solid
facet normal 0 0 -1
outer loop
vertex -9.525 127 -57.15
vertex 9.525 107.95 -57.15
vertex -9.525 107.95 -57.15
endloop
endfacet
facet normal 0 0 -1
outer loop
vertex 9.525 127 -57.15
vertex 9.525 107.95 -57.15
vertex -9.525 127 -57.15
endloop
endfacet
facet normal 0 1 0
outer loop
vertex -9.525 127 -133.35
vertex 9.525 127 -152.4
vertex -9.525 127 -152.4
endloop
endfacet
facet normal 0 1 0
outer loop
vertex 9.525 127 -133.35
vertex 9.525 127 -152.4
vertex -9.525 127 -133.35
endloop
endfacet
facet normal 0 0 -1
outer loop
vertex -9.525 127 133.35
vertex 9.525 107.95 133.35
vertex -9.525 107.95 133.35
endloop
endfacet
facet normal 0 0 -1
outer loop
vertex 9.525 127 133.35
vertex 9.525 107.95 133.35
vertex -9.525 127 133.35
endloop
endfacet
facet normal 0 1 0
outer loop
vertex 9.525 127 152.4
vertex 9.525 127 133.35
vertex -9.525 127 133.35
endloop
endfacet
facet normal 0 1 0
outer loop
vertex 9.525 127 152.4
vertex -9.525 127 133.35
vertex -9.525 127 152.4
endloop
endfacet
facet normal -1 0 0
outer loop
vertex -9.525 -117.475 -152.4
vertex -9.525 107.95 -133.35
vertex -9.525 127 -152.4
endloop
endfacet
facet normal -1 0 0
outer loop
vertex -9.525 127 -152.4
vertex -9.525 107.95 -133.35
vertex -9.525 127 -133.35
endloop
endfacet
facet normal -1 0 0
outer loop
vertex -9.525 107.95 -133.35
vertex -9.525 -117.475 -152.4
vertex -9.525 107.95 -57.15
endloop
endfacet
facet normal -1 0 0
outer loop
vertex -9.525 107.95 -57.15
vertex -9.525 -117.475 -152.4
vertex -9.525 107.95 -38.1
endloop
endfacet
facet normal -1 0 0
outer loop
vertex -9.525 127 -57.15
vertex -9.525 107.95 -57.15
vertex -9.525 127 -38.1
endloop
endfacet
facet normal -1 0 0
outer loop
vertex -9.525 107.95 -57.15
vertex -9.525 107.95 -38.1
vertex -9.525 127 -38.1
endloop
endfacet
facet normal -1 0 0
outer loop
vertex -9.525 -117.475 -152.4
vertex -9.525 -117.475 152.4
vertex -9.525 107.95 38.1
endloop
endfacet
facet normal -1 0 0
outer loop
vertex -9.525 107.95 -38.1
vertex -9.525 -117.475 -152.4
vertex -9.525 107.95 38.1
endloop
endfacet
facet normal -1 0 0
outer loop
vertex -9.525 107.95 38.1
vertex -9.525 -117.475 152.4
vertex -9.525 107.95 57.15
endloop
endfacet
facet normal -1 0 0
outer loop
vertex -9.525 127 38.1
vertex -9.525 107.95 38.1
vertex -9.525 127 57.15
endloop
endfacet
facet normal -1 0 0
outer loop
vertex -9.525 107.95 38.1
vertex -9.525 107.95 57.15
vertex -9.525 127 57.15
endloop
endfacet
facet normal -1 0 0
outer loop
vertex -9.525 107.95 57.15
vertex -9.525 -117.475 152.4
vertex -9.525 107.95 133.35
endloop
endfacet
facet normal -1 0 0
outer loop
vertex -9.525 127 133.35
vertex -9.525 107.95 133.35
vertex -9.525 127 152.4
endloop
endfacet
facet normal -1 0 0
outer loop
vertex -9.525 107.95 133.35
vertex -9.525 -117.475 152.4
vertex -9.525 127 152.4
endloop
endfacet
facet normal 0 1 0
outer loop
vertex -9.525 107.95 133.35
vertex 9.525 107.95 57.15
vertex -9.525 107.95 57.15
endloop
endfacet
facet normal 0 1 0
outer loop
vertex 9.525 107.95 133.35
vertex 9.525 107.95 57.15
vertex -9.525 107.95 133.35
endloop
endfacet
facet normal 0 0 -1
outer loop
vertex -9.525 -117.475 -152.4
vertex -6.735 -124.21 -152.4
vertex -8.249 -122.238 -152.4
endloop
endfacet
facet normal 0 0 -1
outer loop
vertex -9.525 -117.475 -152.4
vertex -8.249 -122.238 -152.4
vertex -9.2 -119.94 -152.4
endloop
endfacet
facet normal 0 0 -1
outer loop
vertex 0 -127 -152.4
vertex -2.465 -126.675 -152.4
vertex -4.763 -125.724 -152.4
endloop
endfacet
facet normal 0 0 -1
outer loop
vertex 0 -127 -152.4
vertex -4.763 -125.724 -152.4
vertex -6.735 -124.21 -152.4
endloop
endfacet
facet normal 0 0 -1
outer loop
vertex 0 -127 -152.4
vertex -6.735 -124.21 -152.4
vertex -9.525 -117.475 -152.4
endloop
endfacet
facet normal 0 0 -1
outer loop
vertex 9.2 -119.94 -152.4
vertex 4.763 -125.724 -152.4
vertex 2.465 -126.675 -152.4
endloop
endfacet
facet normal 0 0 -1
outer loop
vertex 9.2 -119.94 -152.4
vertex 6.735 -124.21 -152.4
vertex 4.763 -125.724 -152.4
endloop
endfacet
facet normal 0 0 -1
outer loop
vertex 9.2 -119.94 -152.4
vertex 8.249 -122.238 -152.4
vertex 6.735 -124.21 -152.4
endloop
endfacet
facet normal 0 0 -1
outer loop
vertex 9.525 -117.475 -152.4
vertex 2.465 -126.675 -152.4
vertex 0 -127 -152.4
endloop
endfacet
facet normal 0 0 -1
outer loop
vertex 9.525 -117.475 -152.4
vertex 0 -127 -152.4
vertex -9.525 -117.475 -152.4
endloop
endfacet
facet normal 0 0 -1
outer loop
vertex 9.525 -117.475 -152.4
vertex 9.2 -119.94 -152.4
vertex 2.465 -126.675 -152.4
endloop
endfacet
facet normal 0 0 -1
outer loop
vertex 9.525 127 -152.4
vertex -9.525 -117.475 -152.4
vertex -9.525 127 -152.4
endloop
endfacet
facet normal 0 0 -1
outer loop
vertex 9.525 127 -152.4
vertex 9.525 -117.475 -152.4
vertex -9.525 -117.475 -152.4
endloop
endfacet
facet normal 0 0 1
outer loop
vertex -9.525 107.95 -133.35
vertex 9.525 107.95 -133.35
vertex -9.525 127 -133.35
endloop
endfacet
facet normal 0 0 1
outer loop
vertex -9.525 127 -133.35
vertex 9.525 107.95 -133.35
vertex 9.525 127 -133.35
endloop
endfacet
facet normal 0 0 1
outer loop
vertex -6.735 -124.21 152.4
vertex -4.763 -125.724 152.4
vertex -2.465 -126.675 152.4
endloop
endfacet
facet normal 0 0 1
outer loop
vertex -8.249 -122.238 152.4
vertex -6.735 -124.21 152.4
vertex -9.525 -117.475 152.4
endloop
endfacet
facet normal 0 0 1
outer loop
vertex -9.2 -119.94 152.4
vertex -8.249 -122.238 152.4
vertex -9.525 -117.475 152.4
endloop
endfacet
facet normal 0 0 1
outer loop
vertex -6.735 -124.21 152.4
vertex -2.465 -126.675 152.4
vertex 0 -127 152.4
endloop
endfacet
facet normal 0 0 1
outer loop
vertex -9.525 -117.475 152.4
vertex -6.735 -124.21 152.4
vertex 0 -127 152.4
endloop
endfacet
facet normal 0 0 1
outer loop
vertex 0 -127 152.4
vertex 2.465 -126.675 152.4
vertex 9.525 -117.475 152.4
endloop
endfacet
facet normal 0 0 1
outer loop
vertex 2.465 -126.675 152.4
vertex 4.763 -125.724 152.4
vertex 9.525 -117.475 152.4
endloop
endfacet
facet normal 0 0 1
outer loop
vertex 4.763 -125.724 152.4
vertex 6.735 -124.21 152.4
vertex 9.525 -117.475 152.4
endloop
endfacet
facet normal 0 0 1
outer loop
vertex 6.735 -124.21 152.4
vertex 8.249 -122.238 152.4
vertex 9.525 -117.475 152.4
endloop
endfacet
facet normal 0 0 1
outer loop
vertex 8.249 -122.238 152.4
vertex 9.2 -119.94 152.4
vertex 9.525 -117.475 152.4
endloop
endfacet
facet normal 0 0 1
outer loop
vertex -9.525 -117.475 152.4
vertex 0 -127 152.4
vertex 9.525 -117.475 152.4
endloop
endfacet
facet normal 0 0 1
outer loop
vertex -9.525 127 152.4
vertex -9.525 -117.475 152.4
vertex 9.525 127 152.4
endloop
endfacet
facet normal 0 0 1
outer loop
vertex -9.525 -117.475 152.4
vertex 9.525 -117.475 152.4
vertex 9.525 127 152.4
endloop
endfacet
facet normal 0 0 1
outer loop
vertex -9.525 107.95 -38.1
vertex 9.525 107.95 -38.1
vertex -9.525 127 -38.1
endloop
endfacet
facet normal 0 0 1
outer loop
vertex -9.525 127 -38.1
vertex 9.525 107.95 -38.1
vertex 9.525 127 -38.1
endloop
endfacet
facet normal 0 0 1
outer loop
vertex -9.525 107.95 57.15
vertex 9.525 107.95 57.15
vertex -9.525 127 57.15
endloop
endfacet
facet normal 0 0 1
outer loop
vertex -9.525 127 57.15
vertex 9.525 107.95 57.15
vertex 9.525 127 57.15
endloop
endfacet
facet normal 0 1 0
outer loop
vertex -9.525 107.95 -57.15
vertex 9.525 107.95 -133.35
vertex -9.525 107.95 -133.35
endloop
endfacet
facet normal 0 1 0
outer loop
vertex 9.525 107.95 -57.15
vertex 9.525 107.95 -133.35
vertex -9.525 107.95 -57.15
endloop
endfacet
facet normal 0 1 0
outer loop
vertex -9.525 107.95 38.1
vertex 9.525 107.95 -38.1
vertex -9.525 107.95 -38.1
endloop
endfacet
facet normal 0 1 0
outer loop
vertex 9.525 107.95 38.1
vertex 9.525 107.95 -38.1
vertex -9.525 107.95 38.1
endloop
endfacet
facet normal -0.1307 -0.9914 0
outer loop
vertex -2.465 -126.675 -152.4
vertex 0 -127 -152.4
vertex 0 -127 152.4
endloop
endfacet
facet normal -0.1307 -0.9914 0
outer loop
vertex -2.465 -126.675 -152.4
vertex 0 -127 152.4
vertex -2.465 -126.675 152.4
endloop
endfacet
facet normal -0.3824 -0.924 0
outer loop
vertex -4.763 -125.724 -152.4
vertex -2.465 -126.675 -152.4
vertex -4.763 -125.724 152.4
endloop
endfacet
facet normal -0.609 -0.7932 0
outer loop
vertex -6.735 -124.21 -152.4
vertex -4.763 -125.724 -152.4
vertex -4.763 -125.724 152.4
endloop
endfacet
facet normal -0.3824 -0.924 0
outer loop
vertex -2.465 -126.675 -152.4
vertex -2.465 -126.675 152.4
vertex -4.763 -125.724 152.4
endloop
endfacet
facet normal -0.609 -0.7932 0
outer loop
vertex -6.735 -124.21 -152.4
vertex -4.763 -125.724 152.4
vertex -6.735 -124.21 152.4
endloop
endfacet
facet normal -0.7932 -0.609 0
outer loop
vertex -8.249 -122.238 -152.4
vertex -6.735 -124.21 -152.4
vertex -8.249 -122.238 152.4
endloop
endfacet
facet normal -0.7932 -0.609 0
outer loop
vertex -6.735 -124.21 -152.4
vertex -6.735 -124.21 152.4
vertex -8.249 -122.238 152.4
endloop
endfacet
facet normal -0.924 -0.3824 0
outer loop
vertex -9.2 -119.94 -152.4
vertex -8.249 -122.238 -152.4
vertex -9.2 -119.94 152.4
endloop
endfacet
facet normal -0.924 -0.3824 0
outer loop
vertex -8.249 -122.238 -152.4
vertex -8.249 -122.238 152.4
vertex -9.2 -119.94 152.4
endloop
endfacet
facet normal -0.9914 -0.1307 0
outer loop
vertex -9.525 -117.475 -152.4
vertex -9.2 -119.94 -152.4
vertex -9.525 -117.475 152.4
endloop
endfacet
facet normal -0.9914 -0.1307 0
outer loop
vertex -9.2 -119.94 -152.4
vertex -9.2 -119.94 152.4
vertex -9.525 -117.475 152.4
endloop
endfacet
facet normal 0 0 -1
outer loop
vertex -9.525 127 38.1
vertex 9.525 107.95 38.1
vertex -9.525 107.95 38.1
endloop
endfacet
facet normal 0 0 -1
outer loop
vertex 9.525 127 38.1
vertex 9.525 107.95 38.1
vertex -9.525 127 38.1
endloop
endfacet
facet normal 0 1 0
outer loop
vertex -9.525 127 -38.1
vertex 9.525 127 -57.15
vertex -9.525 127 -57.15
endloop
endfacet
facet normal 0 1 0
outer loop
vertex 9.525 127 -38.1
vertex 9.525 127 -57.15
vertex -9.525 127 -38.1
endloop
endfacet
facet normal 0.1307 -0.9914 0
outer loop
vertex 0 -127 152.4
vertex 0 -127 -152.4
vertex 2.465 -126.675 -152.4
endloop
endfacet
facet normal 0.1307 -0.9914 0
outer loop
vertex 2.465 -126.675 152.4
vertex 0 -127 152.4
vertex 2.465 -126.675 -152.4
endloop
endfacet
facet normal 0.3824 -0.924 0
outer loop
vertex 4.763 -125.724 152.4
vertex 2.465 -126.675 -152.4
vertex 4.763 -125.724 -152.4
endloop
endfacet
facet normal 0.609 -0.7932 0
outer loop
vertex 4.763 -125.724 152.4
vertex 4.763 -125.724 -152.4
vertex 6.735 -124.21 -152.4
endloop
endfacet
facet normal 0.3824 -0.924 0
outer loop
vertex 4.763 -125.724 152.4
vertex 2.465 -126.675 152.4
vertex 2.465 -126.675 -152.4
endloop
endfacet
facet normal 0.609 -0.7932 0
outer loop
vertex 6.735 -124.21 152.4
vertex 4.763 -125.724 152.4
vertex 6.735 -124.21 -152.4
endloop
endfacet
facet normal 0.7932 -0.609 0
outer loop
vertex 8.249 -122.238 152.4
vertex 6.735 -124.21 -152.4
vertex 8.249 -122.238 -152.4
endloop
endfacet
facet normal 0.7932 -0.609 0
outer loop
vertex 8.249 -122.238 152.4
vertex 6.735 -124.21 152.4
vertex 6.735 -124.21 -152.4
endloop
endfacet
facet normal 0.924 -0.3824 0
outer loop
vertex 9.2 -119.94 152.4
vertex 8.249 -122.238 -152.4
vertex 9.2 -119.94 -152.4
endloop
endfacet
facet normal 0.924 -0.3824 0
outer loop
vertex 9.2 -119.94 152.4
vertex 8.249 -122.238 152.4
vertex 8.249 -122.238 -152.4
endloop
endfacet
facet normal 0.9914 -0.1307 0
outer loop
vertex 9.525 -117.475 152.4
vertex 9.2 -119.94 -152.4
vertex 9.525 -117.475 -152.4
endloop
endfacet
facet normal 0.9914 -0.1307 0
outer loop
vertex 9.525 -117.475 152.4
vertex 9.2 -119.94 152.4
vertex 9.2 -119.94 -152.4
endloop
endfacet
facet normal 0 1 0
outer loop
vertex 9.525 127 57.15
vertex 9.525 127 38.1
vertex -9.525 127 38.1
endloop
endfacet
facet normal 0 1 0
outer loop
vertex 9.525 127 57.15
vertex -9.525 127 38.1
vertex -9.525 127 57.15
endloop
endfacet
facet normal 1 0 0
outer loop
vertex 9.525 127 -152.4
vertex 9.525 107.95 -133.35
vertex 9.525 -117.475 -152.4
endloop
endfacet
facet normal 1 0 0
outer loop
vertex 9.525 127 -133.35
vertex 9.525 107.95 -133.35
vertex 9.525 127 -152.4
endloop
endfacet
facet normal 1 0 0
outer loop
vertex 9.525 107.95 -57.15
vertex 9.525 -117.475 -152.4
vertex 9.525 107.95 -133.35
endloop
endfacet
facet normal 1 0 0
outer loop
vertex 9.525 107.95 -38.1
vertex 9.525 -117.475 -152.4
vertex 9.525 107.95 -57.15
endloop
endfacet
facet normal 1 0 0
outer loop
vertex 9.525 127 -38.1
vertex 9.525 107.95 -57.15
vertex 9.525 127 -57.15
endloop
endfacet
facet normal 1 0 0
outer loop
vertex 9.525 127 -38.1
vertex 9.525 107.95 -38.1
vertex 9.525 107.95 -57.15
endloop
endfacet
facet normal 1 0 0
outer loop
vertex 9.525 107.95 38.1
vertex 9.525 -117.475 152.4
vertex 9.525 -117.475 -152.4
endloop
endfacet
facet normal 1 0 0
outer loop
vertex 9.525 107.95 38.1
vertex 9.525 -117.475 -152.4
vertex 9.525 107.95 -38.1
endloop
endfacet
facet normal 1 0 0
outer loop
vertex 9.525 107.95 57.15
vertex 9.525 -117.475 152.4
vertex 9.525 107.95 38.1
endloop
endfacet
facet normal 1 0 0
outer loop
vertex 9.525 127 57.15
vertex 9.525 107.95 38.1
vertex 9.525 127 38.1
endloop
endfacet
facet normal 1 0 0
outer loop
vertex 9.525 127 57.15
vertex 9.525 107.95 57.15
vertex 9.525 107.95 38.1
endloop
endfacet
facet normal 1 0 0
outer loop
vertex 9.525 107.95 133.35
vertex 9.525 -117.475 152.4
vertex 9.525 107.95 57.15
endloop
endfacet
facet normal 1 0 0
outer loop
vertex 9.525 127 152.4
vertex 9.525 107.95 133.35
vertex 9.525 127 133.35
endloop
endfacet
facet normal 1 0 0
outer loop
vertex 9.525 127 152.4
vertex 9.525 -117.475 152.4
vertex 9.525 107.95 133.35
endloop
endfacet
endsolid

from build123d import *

# Parameters (mm, degrees)
F0_W     = 254
F0_H     = 304.8
F1_DEPTH = 9.525
F2_R     = 9.52499
F3_W     = 19.05
F3_H     = 76.2
F4_DEPTH = 19.051


# Not quite as in the source:
# - a fillet or chamfer is up to 0.001 mm smaller than in the source, because OpenCascade refuses the exact size
# - a feature names something its author has since deleted; it is built from what else it names


with BuildPart() as f1:
    # F0 (on Right) → F1 (new body, symmetric)
    with BuildSketch(Plane.YZ):
        Rectangle(F0_W, F0_H)
    extrude(amount=F1_DEPTH, both=True)

    # F2 (radius 9.525 in the source; OpenCascade refuses exactly that, so slightly less here)
    f2_edges = [f1.edges().sort_by_distance(p)[0] for p in [
        (9.525, -127, 0),
        (-9.525, -127, 0),
    ]]
    fillet(f2_edges, radius=F2_R)

    # F3 (on face) → F4 (cut, through all)
    with BuildSketch(Plane.YZ.offset(9.525)):
        with Locations((117.475, 95.25)):
            Rectangle(F3_W, F3_H)
        with Locations((117.475, 0)):
            Rectangle(F3_W, F3_H)
        with Locations((117.475, -95.25)):
            Rectangle(F3_W, F3_H)
    extrude(amount=-F4_DEPTH, mode=Mode.SUBTRACT)


solid = f1.part
